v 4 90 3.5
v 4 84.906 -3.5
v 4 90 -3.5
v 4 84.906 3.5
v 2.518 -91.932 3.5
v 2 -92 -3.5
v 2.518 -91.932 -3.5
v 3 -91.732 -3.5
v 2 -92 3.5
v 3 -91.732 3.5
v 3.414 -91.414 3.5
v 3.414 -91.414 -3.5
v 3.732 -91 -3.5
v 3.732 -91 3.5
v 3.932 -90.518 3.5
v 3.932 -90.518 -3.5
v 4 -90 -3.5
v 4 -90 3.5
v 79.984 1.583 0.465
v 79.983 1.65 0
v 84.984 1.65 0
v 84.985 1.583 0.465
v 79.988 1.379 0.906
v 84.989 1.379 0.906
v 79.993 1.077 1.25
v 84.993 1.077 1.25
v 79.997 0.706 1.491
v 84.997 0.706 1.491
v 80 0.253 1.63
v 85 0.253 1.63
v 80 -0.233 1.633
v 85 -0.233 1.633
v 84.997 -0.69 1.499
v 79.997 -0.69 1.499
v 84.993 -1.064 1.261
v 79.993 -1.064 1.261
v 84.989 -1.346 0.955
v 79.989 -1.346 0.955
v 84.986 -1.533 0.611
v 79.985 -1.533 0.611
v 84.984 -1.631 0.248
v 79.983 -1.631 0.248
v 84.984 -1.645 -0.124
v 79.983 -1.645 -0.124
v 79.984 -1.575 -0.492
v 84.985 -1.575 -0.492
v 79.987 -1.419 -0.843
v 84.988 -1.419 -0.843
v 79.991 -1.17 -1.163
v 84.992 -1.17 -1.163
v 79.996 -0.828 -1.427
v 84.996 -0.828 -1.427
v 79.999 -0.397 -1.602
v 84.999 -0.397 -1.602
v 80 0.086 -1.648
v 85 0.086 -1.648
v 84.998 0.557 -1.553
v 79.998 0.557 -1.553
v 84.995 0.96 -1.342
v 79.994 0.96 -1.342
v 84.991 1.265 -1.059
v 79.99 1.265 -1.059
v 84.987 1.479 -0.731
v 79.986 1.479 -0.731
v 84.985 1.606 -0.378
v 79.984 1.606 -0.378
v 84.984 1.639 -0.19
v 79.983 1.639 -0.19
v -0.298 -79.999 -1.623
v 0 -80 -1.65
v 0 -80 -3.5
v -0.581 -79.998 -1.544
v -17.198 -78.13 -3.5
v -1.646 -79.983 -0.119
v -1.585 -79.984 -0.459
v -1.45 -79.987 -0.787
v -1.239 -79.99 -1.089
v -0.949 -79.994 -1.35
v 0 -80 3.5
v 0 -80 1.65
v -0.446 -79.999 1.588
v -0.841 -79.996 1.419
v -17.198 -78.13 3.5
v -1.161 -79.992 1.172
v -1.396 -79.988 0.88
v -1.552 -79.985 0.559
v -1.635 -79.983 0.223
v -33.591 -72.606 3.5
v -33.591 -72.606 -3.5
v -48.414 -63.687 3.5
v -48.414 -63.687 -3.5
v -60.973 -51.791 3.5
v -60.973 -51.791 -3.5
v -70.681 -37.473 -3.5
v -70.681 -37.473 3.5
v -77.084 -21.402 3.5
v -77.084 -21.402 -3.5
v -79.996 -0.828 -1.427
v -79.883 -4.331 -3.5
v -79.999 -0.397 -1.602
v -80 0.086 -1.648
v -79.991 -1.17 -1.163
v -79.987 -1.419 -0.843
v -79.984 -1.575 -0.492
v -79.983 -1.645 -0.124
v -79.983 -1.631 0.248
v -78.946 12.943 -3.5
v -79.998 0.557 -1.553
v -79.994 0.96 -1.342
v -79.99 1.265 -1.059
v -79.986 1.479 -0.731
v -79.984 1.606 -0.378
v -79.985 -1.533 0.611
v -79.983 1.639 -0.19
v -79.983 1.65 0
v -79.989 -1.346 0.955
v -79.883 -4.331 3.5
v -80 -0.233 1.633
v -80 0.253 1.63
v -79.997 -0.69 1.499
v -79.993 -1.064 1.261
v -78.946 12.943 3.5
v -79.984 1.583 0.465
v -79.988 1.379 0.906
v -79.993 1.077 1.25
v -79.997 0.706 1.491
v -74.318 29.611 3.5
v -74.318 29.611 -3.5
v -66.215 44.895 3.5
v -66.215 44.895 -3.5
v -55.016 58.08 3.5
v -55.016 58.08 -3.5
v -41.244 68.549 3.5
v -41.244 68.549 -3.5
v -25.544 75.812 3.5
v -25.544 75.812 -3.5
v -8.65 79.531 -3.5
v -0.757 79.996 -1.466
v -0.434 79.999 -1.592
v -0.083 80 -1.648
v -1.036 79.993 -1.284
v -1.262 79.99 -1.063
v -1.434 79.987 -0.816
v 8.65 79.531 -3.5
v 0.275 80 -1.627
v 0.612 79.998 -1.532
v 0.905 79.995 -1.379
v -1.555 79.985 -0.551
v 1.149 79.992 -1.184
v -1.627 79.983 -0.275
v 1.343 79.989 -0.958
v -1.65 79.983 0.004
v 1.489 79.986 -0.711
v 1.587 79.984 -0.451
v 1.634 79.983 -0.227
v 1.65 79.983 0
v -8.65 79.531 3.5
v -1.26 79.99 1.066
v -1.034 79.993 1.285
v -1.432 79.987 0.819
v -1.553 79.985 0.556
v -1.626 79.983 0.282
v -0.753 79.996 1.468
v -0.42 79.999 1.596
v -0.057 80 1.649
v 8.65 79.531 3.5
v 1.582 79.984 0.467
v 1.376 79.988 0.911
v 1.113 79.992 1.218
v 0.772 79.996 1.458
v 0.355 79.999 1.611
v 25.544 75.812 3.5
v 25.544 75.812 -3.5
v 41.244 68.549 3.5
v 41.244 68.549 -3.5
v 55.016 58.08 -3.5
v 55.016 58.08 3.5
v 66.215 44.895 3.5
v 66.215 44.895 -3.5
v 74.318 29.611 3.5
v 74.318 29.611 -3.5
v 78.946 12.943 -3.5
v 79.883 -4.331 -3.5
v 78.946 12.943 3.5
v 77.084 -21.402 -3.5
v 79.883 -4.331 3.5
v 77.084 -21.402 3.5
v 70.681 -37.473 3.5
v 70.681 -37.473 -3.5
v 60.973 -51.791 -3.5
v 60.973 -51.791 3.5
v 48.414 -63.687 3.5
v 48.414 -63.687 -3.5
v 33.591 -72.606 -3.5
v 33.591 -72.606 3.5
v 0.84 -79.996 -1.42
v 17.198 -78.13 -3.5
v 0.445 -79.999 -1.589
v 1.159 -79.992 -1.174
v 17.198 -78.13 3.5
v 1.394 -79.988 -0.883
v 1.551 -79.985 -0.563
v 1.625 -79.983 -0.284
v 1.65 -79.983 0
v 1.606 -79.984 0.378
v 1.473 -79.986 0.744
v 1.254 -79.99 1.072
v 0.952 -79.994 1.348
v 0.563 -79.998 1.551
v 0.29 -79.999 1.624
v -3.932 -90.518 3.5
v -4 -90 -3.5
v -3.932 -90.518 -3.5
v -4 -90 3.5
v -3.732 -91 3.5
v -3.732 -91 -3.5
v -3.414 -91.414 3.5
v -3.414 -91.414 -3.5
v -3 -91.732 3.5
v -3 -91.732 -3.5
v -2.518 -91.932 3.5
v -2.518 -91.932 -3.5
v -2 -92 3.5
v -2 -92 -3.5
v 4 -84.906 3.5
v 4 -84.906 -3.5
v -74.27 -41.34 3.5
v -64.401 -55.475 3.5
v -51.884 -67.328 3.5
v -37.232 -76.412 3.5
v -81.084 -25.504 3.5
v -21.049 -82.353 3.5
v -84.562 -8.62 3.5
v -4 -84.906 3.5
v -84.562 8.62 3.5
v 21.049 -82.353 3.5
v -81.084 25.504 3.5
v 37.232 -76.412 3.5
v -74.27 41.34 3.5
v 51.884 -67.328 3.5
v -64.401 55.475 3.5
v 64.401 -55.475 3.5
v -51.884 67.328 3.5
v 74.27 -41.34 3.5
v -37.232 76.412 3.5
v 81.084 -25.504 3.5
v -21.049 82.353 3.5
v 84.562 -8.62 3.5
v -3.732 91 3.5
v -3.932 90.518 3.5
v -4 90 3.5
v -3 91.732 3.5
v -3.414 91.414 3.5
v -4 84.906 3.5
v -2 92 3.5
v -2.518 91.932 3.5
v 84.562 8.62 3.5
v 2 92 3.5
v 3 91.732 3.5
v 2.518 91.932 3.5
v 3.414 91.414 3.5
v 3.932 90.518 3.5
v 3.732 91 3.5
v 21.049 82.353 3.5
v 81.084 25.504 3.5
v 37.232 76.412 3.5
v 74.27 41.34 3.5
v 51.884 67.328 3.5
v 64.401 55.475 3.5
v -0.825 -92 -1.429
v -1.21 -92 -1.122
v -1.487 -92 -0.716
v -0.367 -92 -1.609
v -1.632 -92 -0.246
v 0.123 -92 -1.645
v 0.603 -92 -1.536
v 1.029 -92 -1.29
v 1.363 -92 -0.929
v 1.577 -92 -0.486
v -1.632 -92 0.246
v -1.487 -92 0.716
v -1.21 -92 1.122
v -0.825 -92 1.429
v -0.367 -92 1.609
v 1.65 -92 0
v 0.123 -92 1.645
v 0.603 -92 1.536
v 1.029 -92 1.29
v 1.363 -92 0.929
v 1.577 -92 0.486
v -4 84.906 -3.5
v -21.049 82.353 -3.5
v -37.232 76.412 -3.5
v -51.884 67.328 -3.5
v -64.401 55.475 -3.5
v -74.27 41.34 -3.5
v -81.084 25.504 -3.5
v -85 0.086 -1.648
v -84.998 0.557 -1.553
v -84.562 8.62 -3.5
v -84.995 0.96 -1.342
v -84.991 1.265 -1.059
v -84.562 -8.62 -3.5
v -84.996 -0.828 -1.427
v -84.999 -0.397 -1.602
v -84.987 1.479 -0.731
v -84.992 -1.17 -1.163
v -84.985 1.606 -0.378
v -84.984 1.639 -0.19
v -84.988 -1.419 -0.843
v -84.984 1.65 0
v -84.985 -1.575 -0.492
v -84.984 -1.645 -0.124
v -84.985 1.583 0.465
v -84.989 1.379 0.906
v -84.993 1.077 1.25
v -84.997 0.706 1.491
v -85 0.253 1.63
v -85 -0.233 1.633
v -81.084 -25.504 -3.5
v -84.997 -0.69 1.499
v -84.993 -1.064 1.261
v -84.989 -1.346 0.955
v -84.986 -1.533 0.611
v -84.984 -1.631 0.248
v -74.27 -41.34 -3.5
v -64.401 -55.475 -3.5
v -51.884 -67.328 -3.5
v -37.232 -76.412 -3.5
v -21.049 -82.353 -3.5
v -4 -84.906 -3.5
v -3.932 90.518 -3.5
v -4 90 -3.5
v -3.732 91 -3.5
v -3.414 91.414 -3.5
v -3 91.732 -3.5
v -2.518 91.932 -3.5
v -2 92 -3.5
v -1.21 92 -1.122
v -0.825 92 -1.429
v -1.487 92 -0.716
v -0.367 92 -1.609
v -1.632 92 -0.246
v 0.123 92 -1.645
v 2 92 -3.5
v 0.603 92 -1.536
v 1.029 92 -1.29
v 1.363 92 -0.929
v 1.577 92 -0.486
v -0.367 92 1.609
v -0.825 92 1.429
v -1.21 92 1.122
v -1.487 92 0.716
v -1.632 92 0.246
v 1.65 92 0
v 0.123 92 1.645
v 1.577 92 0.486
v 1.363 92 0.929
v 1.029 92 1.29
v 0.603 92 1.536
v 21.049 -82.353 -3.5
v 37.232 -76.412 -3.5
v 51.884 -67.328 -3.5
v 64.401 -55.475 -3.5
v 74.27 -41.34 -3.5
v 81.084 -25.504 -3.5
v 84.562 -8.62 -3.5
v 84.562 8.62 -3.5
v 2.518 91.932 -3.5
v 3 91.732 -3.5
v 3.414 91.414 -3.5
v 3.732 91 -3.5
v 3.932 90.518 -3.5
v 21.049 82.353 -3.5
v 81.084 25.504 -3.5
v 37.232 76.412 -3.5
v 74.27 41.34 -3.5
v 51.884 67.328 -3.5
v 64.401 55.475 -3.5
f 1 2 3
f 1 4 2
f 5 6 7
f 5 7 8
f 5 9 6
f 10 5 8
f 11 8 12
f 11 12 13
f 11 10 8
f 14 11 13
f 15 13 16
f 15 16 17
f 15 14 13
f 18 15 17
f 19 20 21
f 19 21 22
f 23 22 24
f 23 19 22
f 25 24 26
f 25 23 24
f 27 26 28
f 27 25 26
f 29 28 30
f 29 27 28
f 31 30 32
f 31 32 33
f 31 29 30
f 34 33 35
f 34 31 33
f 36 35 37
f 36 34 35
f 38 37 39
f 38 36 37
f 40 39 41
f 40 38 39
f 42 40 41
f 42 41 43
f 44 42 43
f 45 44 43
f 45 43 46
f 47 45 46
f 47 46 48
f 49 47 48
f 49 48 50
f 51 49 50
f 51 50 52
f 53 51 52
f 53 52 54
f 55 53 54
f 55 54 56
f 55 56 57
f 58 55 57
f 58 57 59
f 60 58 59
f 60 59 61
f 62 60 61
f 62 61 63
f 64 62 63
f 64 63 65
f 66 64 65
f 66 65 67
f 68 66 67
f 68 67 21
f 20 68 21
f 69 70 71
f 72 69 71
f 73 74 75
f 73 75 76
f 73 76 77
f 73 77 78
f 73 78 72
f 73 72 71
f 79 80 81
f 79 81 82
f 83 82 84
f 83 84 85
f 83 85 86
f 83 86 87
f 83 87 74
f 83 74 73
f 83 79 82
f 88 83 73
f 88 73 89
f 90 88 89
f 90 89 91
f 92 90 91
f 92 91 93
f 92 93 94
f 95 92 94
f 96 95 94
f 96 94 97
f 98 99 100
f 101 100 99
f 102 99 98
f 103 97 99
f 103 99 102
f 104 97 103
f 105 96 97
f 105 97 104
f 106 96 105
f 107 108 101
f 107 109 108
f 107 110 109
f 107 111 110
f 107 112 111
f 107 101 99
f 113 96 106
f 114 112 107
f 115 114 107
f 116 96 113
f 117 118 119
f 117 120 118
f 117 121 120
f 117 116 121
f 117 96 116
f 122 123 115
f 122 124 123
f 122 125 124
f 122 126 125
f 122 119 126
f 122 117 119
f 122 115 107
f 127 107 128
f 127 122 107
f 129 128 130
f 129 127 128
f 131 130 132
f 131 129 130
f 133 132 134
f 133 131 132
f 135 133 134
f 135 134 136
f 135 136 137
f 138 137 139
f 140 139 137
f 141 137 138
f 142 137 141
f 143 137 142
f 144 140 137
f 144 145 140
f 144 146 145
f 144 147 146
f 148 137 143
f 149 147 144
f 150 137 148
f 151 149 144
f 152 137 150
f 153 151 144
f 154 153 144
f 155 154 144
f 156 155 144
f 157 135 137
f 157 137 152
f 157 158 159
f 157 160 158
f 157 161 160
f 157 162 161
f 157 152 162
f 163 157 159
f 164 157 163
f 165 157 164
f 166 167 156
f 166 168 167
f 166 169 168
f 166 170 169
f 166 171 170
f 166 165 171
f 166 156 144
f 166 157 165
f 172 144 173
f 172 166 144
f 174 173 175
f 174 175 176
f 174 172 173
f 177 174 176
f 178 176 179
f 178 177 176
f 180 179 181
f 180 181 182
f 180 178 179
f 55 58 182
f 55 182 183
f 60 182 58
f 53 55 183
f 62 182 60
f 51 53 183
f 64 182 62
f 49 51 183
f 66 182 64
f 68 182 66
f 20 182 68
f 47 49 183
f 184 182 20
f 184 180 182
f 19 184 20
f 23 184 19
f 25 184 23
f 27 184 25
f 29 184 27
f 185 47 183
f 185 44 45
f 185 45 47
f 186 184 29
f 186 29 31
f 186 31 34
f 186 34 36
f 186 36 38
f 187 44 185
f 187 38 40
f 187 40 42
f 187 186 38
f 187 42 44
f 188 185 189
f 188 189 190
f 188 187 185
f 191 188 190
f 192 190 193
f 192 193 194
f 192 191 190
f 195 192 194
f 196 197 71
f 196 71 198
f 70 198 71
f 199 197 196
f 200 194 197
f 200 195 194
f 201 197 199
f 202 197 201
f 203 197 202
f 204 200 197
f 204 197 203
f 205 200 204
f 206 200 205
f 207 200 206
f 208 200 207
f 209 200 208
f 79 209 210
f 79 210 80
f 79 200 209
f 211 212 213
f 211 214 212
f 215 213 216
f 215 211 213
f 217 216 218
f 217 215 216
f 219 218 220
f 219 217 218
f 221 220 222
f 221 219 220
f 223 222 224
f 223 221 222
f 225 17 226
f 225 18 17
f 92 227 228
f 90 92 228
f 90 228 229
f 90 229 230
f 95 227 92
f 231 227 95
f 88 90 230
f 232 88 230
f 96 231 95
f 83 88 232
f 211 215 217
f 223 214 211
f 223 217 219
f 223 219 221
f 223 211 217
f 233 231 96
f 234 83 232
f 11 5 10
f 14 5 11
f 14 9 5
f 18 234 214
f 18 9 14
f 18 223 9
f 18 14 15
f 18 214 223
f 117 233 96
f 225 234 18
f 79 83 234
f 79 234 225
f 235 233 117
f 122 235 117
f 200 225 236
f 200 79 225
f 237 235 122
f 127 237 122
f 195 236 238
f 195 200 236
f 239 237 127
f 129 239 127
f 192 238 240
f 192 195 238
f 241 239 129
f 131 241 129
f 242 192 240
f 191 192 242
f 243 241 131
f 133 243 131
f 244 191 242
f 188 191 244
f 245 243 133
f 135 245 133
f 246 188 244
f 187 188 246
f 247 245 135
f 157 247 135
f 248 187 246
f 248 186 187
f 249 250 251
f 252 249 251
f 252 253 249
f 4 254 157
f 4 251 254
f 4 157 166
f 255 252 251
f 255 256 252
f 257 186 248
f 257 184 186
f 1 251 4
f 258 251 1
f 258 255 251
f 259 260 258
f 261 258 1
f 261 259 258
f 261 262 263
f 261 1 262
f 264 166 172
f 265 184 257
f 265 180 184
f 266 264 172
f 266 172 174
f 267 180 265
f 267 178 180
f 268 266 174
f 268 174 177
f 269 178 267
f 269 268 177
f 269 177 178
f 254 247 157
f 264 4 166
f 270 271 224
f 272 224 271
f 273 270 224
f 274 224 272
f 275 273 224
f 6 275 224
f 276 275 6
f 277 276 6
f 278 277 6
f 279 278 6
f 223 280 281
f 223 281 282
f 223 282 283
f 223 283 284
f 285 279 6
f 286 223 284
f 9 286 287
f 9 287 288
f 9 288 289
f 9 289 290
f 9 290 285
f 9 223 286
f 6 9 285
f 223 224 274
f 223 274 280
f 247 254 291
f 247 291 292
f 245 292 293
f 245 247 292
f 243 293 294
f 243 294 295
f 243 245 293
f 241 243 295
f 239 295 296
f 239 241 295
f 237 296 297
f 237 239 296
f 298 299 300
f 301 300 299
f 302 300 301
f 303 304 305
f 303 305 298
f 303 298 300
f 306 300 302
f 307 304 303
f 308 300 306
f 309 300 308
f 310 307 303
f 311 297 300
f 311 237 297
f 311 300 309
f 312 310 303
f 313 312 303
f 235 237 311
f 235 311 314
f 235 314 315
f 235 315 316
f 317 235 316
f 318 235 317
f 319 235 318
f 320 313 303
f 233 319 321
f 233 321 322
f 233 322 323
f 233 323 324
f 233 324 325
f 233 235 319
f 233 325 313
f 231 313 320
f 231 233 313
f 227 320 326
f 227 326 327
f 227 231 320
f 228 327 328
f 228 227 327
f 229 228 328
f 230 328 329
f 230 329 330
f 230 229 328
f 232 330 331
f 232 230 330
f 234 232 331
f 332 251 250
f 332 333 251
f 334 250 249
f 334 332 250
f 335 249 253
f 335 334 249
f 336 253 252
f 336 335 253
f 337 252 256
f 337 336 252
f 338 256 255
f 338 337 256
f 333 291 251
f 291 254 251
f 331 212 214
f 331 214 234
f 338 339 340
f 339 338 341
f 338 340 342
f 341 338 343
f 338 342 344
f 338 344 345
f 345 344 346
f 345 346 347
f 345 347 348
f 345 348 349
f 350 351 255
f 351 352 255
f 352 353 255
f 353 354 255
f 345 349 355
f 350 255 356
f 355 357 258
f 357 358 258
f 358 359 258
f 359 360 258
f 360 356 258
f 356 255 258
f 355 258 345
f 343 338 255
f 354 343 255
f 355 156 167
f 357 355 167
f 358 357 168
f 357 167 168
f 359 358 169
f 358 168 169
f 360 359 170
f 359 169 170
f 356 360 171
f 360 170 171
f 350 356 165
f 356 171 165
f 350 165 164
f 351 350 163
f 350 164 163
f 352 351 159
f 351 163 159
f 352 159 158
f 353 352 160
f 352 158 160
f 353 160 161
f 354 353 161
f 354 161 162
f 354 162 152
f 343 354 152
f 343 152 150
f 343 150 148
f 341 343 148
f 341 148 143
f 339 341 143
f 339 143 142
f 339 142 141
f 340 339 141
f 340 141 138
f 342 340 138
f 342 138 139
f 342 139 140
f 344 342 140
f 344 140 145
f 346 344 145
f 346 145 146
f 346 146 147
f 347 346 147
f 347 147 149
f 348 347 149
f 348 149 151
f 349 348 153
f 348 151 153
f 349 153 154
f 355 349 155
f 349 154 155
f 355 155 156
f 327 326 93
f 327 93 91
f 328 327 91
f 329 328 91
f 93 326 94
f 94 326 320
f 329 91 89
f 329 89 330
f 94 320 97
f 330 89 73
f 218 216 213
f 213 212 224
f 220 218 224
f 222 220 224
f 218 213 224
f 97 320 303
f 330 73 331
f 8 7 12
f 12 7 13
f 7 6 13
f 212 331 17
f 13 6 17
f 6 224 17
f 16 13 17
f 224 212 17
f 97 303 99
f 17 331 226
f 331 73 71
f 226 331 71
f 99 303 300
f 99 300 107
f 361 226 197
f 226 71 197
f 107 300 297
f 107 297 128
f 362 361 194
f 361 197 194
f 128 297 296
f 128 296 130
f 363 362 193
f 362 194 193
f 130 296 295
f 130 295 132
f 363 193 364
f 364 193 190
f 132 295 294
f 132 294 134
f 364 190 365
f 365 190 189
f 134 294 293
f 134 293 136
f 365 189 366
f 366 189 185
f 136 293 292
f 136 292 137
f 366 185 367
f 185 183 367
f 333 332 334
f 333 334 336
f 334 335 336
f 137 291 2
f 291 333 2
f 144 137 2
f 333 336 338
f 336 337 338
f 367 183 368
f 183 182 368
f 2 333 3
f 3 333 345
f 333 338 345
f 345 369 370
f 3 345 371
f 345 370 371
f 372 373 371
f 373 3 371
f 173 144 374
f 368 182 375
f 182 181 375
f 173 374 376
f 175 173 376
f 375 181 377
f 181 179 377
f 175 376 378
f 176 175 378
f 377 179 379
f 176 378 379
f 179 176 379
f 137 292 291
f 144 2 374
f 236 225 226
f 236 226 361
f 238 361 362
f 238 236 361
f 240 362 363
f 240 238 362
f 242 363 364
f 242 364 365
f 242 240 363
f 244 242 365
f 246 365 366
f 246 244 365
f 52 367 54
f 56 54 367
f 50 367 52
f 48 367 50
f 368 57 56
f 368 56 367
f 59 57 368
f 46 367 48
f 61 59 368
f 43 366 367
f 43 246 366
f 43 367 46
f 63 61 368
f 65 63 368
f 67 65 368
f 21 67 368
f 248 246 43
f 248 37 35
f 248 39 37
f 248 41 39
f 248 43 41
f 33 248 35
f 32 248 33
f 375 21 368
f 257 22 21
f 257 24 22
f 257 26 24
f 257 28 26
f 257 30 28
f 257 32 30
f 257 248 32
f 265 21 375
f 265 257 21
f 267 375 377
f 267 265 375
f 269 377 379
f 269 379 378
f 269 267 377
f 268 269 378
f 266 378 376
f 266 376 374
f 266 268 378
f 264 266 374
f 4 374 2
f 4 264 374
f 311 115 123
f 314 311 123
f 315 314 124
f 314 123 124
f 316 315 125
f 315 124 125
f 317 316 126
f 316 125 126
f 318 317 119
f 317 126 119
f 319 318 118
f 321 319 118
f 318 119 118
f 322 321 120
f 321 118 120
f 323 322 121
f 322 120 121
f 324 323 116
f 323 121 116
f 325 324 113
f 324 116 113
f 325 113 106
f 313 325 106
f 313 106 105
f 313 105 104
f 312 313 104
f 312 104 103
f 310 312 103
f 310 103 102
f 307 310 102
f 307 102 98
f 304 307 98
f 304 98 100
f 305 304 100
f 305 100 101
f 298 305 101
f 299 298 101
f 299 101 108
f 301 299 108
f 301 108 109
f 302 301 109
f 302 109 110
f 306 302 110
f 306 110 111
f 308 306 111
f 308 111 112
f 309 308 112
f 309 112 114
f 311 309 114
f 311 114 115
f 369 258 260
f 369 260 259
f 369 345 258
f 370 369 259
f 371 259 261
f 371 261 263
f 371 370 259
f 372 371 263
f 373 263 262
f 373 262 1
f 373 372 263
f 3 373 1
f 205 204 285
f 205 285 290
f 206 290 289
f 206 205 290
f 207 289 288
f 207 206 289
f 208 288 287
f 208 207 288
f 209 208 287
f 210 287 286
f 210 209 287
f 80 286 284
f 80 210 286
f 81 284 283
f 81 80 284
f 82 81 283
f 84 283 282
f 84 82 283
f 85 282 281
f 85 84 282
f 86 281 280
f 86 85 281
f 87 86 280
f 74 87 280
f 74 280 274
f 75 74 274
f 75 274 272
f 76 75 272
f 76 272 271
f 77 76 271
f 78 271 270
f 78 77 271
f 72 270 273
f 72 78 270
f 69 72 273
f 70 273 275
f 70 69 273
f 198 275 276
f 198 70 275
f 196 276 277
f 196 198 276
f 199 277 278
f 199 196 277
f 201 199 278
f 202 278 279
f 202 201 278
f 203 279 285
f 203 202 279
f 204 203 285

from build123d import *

# Parameters (mm, degrees)
SKETCH074_R          = 85
SKETCH074_R_2        = 80
SKETCH074_W          = 8
SKETCH074_H          = 12
PAD006_DEPTH         = 3.5
PAD007_DEPTH         = 3.5
SKETCH076_R          = 1.65
POCKET004_DEPTH      = 85.001
POCKET004_DEPTH_BACK = 85.001
SKETCH075_R          = 1.65
POCKET005_DEPTH      = 92.001
POCKET005_DEPTH_BACK = 92.001
FILLET001_R          = 2


with BuildPart() as part:
    # Sketch074 → Pad006 (new body, symmetric)
    with BuildSketch(Plane.XY):
        Circle(SKETCH074_R)
        Circle(SKETCH074_R_2, mode=Mode.SUBTRACT)
        with Locations((0, 86)):
            Rectangle(SKETCH074_W, SKETCH074_H)
        with Locations((0, -86)):
            Rectangle(SKETCH074_W, SKETCH074_H)
    extrude(amount=PAD006_DEPTH, both=True)

    # Sketch074 → Pad007 (join, symmetric)
    with BuildSketch(Plane.XY):
        Circle(SKETCH074_R)
        Circle(SKETCH074_R_2, mode=Mode.SUBTRACT)
        with Locations((0, 86)):
            Rectangle(SKETCH074_W, SKETCH074_H)
        with Locations((0, -86)):
            Rectangle(SKETCH074_W, SKETCH074_H)
    extrude(amount=PAD007_DEPTH, both=True)

    # Sketch076 → Pocket004 (cut, two sides)
    with BuildSketch(Plane.YZ) as pocket004_sk:
        Circle(SKETCH076_R)
    extrude(amount=-POCKET004_DEPTH, mode=Mode.SUBTRACT)
    extrude(pocket004_sk.sketch, amount=POCKET004_DEPTH_BACK, mode=Mode.SUBTRACT)

    # Sketch075 → Pocket005 (cut, two sides)
    with BuildSketch(Plane.XZ) as pocket005_sk:
        Circle(SKETCH075_R)
    extrude(amount=-POCKET005_DEPTH, mode=Mode.SUBTRACT)
    extrude(pocket005_sk.sketch, amount=POCKET005_DEPTH_BACK, mode=Mode.SUBTRACT)

    # Fillet001
    fillet001_edges = [part.edges().sort_by_distance(p)[0] for p in [
        (4, -92, 0),
        (-4, -92, 0),
        (-4, 92, 0),
        (4, 92, 0),
    ]]
    fillet(fillet001_edges, radius=FILLET001_R)


solid = part.part
